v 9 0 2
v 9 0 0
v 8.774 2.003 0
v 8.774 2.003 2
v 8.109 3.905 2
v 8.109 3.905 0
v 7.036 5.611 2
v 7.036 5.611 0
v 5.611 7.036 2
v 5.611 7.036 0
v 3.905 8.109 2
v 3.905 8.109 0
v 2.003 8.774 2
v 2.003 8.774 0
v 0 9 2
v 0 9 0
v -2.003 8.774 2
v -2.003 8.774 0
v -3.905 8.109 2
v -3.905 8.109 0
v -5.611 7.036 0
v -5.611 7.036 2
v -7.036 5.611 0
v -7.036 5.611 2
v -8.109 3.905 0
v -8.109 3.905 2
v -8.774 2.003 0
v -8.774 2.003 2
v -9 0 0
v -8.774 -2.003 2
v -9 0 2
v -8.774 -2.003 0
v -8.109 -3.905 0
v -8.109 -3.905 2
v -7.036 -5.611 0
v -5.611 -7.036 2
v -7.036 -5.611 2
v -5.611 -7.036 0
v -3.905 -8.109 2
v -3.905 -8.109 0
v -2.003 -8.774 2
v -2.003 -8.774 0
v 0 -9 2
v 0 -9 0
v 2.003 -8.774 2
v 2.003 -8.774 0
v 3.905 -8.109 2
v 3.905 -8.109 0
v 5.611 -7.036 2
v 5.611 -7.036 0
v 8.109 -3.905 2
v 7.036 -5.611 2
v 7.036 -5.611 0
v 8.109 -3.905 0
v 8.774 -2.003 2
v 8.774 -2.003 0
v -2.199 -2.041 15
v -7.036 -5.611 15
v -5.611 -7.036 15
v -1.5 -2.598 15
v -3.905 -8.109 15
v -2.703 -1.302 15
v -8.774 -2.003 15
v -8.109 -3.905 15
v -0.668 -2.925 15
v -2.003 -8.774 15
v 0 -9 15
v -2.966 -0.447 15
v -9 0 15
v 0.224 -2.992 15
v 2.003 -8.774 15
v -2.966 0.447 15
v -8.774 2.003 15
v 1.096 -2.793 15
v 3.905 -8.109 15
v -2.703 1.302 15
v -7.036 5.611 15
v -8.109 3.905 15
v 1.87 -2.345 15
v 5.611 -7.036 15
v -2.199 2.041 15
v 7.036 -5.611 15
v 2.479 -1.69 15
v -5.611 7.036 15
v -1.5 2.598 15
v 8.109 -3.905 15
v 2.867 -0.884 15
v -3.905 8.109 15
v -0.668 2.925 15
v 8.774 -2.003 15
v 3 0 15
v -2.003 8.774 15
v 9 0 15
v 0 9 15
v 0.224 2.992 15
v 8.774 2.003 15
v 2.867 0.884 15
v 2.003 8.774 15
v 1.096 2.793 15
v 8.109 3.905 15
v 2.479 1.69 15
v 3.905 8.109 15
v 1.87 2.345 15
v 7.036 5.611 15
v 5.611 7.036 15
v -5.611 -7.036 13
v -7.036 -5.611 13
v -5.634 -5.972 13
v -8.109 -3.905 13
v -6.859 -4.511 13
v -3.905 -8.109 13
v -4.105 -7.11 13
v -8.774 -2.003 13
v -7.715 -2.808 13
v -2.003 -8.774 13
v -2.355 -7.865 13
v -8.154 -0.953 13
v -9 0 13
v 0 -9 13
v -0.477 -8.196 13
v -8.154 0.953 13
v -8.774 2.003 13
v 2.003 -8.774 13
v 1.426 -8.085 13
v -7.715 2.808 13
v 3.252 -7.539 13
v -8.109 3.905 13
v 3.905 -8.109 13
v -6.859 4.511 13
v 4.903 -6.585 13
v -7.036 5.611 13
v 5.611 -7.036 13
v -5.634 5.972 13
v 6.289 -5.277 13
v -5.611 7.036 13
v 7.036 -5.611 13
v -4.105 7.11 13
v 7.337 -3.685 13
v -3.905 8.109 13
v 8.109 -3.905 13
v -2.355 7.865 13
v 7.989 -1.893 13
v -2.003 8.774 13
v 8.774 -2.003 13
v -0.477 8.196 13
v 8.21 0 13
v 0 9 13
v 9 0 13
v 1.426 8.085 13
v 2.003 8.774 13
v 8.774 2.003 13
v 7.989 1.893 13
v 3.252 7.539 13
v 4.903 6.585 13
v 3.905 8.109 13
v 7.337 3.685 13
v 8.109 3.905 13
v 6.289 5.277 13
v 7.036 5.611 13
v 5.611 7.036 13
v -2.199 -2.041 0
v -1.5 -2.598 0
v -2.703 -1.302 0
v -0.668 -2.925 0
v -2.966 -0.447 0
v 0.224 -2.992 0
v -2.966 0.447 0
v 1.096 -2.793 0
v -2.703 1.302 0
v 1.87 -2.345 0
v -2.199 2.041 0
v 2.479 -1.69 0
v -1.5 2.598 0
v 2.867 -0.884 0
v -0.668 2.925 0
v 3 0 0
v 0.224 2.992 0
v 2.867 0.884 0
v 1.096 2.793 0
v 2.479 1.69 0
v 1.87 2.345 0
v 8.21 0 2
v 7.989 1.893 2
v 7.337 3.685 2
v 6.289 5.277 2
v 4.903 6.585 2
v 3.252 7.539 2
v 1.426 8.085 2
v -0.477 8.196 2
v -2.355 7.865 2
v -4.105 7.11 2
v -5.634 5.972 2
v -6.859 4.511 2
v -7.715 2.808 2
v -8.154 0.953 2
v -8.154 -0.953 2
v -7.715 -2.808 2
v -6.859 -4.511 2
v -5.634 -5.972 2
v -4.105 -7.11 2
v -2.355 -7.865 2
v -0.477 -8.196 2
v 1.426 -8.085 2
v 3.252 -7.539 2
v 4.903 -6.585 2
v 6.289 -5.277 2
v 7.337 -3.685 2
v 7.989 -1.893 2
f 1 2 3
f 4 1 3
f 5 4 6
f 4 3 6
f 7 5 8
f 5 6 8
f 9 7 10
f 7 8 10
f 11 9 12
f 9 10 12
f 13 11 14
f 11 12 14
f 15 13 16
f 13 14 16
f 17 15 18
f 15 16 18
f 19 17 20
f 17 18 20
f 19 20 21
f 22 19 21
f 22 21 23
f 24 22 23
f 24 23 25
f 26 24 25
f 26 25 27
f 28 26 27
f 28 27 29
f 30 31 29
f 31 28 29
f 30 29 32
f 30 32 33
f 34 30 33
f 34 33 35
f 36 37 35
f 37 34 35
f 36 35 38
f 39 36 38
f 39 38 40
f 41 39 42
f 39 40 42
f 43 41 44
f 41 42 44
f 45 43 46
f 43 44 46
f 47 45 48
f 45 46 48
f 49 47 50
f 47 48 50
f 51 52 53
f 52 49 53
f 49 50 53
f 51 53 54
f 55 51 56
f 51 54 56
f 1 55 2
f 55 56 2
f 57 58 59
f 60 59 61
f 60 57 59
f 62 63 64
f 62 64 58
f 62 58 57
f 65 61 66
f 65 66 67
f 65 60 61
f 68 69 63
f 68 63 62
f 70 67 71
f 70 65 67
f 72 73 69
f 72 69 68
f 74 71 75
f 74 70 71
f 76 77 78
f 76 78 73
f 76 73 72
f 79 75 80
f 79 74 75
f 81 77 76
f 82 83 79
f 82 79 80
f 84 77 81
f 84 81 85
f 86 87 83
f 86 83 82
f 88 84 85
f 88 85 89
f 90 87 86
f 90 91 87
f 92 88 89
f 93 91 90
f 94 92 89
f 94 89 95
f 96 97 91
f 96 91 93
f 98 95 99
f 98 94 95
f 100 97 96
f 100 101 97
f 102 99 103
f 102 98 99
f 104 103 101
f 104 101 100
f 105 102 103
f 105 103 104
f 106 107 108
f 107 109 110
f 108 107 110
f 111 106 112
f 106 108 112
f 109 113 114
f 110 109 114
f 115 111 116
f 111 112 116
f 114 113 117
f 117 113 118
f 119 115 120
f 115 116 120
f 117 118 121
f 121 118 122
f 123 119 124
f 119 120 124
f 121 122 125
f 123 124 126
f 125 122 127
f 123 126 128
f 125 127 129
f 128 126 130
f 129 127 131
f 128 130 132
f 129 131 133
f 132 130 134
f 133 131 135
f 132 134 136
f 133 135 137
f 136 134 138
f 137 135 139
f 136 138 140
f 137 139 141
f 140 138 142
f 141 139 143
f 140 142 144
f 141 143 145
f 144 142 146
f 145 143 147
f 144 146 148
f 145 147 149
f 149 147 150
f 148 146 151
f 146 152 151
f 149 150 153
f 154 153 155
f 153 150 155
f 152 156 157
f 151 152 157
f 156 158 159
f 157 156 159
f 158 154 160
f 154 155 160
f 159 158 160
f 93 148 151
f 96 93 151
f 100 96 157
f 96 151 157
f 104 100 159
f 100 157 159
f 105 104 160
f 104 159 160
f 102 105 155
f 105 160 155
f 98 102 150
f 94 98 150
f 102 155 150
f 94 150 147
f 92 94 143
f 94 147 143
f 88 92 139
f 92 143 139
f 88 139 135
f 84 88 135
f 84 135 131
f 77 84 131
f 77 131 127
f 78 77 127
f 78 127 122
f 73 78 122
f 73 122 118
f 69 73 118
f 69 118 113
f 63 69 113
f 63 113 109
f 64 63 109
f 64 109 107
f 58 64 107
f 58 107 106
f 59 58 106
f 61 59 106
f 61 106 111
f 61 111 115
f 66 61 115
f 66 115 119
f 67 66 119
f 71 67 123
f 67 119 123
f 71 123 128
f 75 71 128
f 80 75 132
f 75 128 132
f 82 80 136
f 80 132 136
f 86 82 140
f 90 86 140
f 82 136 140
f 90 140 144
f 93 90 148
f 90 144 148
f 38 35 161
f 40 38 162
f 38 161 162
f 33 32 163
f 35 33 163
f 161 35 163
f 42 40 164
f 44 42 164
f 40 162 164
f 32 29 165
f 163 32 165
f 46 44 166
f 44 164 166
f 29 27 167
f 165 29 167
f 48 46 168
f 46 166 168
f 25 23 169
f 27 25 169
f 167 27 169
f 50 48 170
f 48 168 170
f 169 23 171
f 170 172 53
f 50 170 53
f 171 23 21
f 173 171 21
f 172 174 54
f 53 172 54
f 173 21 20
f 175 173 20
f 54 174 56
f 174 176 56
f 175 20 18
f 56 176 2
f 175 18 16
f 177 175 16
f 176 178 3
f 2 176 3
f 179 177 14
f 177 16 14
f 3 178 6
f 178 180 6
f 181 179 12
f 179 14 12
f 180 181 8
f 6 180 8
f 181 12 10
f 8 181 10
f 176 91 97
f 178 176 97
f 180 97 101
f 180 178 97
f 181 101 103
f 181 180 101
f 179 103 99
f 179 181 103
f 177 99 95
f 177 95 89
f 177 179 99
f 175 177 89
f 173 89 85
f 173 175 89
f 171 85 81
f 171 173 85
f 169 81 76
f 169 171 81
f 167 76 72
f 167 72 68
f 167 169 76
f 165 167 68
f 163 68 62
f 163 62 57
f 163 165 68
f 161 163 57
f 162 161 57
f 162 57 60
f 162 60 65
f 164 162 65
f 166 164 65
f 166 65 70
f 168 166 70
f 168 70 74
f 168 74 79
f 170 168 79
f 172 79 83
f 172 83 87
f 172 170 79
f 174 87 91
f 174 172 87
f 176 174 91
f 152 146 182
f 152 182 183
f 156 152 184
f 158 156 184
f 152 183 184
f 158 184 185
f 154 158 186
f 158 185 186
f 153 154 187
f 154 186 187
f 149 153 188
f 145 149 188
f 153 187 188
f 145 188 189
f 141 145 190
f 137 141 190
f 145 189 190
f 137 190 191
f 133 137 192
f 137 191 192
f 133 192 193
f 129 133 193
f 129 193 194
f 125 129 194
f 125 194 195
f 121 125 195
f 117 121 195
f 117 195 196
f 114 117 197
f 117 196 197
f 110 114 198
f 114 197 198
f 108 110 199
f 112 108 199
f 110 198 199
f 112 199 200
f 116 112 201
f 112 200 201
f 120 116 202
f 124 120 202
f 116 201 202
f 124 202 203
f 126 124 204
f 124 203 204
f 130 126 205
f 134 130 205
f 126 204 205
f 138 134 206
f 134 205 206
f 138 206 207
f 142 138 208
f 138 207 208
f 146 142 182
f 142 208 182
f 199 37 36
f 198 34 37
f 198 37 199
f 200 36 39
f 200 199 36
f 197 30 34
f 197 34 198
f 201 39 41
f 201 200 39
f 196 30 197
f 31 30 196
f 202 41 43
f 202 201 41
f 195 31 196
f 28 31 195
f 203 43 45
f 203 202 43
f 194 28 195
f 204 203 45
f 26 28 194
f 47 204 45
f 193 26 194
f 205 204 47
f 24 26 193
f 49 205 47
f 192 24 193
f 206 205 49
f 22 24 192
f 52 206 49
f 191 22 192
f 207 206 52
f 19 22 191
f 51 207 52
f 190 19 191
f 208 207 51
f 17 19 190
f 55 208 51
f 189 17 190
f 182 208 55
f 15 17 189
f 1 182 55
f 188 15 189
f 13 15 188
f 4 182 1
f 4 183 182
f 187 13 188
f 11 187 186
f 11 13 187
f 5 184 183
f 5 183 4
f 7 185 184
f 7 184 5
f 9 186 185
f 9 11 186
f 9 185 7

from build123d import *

# Parameters (mm, degrees)
SKETCH_1_R               = 9
SKETCH_1_R_2             = 3
EXTRUDE_1_DEPTH          = 15
CUT_EXTRUDE_1_DEPTH      = 5.5
CUT_EXTRUDE_1_DEPTH_BACK = 5.5
SKETCH_3_R               = 18.21
SKETCH_3_R_2             = 8.21


with BuildPart() as part:
    # 草图1 → 凸台-拉伸1 (new body)
    with BuildSketch(Plane.XY):
        Circle(SKETCH_1_R)
        Circle(SKETCH_1_R_2, mode=Mode.SUBTRACT)
    extrude(amount=EXTRUDE_1_DEPTH)

    # 草图3 → 切除-拉伸-薄壁1 (cut, two sides: drawn at the far end of the back side and taken through both)
    with BuildSketch(Plane.XY.offset(7.5).offset(-CUT_EXTRUDE_1_DEPTH_BACK)):
        Circle(SKETCH_3_R)
        Circle(SKETCH_3_R_2, mode=Mode.SUBTRACT)
    extrude(amount=CUT_EXTRUDE_1_DEPTH + CUT_EXTRUDE_1_DEPTH_BACK, mode=Mode.SUBTRACT)


solid = part.part
